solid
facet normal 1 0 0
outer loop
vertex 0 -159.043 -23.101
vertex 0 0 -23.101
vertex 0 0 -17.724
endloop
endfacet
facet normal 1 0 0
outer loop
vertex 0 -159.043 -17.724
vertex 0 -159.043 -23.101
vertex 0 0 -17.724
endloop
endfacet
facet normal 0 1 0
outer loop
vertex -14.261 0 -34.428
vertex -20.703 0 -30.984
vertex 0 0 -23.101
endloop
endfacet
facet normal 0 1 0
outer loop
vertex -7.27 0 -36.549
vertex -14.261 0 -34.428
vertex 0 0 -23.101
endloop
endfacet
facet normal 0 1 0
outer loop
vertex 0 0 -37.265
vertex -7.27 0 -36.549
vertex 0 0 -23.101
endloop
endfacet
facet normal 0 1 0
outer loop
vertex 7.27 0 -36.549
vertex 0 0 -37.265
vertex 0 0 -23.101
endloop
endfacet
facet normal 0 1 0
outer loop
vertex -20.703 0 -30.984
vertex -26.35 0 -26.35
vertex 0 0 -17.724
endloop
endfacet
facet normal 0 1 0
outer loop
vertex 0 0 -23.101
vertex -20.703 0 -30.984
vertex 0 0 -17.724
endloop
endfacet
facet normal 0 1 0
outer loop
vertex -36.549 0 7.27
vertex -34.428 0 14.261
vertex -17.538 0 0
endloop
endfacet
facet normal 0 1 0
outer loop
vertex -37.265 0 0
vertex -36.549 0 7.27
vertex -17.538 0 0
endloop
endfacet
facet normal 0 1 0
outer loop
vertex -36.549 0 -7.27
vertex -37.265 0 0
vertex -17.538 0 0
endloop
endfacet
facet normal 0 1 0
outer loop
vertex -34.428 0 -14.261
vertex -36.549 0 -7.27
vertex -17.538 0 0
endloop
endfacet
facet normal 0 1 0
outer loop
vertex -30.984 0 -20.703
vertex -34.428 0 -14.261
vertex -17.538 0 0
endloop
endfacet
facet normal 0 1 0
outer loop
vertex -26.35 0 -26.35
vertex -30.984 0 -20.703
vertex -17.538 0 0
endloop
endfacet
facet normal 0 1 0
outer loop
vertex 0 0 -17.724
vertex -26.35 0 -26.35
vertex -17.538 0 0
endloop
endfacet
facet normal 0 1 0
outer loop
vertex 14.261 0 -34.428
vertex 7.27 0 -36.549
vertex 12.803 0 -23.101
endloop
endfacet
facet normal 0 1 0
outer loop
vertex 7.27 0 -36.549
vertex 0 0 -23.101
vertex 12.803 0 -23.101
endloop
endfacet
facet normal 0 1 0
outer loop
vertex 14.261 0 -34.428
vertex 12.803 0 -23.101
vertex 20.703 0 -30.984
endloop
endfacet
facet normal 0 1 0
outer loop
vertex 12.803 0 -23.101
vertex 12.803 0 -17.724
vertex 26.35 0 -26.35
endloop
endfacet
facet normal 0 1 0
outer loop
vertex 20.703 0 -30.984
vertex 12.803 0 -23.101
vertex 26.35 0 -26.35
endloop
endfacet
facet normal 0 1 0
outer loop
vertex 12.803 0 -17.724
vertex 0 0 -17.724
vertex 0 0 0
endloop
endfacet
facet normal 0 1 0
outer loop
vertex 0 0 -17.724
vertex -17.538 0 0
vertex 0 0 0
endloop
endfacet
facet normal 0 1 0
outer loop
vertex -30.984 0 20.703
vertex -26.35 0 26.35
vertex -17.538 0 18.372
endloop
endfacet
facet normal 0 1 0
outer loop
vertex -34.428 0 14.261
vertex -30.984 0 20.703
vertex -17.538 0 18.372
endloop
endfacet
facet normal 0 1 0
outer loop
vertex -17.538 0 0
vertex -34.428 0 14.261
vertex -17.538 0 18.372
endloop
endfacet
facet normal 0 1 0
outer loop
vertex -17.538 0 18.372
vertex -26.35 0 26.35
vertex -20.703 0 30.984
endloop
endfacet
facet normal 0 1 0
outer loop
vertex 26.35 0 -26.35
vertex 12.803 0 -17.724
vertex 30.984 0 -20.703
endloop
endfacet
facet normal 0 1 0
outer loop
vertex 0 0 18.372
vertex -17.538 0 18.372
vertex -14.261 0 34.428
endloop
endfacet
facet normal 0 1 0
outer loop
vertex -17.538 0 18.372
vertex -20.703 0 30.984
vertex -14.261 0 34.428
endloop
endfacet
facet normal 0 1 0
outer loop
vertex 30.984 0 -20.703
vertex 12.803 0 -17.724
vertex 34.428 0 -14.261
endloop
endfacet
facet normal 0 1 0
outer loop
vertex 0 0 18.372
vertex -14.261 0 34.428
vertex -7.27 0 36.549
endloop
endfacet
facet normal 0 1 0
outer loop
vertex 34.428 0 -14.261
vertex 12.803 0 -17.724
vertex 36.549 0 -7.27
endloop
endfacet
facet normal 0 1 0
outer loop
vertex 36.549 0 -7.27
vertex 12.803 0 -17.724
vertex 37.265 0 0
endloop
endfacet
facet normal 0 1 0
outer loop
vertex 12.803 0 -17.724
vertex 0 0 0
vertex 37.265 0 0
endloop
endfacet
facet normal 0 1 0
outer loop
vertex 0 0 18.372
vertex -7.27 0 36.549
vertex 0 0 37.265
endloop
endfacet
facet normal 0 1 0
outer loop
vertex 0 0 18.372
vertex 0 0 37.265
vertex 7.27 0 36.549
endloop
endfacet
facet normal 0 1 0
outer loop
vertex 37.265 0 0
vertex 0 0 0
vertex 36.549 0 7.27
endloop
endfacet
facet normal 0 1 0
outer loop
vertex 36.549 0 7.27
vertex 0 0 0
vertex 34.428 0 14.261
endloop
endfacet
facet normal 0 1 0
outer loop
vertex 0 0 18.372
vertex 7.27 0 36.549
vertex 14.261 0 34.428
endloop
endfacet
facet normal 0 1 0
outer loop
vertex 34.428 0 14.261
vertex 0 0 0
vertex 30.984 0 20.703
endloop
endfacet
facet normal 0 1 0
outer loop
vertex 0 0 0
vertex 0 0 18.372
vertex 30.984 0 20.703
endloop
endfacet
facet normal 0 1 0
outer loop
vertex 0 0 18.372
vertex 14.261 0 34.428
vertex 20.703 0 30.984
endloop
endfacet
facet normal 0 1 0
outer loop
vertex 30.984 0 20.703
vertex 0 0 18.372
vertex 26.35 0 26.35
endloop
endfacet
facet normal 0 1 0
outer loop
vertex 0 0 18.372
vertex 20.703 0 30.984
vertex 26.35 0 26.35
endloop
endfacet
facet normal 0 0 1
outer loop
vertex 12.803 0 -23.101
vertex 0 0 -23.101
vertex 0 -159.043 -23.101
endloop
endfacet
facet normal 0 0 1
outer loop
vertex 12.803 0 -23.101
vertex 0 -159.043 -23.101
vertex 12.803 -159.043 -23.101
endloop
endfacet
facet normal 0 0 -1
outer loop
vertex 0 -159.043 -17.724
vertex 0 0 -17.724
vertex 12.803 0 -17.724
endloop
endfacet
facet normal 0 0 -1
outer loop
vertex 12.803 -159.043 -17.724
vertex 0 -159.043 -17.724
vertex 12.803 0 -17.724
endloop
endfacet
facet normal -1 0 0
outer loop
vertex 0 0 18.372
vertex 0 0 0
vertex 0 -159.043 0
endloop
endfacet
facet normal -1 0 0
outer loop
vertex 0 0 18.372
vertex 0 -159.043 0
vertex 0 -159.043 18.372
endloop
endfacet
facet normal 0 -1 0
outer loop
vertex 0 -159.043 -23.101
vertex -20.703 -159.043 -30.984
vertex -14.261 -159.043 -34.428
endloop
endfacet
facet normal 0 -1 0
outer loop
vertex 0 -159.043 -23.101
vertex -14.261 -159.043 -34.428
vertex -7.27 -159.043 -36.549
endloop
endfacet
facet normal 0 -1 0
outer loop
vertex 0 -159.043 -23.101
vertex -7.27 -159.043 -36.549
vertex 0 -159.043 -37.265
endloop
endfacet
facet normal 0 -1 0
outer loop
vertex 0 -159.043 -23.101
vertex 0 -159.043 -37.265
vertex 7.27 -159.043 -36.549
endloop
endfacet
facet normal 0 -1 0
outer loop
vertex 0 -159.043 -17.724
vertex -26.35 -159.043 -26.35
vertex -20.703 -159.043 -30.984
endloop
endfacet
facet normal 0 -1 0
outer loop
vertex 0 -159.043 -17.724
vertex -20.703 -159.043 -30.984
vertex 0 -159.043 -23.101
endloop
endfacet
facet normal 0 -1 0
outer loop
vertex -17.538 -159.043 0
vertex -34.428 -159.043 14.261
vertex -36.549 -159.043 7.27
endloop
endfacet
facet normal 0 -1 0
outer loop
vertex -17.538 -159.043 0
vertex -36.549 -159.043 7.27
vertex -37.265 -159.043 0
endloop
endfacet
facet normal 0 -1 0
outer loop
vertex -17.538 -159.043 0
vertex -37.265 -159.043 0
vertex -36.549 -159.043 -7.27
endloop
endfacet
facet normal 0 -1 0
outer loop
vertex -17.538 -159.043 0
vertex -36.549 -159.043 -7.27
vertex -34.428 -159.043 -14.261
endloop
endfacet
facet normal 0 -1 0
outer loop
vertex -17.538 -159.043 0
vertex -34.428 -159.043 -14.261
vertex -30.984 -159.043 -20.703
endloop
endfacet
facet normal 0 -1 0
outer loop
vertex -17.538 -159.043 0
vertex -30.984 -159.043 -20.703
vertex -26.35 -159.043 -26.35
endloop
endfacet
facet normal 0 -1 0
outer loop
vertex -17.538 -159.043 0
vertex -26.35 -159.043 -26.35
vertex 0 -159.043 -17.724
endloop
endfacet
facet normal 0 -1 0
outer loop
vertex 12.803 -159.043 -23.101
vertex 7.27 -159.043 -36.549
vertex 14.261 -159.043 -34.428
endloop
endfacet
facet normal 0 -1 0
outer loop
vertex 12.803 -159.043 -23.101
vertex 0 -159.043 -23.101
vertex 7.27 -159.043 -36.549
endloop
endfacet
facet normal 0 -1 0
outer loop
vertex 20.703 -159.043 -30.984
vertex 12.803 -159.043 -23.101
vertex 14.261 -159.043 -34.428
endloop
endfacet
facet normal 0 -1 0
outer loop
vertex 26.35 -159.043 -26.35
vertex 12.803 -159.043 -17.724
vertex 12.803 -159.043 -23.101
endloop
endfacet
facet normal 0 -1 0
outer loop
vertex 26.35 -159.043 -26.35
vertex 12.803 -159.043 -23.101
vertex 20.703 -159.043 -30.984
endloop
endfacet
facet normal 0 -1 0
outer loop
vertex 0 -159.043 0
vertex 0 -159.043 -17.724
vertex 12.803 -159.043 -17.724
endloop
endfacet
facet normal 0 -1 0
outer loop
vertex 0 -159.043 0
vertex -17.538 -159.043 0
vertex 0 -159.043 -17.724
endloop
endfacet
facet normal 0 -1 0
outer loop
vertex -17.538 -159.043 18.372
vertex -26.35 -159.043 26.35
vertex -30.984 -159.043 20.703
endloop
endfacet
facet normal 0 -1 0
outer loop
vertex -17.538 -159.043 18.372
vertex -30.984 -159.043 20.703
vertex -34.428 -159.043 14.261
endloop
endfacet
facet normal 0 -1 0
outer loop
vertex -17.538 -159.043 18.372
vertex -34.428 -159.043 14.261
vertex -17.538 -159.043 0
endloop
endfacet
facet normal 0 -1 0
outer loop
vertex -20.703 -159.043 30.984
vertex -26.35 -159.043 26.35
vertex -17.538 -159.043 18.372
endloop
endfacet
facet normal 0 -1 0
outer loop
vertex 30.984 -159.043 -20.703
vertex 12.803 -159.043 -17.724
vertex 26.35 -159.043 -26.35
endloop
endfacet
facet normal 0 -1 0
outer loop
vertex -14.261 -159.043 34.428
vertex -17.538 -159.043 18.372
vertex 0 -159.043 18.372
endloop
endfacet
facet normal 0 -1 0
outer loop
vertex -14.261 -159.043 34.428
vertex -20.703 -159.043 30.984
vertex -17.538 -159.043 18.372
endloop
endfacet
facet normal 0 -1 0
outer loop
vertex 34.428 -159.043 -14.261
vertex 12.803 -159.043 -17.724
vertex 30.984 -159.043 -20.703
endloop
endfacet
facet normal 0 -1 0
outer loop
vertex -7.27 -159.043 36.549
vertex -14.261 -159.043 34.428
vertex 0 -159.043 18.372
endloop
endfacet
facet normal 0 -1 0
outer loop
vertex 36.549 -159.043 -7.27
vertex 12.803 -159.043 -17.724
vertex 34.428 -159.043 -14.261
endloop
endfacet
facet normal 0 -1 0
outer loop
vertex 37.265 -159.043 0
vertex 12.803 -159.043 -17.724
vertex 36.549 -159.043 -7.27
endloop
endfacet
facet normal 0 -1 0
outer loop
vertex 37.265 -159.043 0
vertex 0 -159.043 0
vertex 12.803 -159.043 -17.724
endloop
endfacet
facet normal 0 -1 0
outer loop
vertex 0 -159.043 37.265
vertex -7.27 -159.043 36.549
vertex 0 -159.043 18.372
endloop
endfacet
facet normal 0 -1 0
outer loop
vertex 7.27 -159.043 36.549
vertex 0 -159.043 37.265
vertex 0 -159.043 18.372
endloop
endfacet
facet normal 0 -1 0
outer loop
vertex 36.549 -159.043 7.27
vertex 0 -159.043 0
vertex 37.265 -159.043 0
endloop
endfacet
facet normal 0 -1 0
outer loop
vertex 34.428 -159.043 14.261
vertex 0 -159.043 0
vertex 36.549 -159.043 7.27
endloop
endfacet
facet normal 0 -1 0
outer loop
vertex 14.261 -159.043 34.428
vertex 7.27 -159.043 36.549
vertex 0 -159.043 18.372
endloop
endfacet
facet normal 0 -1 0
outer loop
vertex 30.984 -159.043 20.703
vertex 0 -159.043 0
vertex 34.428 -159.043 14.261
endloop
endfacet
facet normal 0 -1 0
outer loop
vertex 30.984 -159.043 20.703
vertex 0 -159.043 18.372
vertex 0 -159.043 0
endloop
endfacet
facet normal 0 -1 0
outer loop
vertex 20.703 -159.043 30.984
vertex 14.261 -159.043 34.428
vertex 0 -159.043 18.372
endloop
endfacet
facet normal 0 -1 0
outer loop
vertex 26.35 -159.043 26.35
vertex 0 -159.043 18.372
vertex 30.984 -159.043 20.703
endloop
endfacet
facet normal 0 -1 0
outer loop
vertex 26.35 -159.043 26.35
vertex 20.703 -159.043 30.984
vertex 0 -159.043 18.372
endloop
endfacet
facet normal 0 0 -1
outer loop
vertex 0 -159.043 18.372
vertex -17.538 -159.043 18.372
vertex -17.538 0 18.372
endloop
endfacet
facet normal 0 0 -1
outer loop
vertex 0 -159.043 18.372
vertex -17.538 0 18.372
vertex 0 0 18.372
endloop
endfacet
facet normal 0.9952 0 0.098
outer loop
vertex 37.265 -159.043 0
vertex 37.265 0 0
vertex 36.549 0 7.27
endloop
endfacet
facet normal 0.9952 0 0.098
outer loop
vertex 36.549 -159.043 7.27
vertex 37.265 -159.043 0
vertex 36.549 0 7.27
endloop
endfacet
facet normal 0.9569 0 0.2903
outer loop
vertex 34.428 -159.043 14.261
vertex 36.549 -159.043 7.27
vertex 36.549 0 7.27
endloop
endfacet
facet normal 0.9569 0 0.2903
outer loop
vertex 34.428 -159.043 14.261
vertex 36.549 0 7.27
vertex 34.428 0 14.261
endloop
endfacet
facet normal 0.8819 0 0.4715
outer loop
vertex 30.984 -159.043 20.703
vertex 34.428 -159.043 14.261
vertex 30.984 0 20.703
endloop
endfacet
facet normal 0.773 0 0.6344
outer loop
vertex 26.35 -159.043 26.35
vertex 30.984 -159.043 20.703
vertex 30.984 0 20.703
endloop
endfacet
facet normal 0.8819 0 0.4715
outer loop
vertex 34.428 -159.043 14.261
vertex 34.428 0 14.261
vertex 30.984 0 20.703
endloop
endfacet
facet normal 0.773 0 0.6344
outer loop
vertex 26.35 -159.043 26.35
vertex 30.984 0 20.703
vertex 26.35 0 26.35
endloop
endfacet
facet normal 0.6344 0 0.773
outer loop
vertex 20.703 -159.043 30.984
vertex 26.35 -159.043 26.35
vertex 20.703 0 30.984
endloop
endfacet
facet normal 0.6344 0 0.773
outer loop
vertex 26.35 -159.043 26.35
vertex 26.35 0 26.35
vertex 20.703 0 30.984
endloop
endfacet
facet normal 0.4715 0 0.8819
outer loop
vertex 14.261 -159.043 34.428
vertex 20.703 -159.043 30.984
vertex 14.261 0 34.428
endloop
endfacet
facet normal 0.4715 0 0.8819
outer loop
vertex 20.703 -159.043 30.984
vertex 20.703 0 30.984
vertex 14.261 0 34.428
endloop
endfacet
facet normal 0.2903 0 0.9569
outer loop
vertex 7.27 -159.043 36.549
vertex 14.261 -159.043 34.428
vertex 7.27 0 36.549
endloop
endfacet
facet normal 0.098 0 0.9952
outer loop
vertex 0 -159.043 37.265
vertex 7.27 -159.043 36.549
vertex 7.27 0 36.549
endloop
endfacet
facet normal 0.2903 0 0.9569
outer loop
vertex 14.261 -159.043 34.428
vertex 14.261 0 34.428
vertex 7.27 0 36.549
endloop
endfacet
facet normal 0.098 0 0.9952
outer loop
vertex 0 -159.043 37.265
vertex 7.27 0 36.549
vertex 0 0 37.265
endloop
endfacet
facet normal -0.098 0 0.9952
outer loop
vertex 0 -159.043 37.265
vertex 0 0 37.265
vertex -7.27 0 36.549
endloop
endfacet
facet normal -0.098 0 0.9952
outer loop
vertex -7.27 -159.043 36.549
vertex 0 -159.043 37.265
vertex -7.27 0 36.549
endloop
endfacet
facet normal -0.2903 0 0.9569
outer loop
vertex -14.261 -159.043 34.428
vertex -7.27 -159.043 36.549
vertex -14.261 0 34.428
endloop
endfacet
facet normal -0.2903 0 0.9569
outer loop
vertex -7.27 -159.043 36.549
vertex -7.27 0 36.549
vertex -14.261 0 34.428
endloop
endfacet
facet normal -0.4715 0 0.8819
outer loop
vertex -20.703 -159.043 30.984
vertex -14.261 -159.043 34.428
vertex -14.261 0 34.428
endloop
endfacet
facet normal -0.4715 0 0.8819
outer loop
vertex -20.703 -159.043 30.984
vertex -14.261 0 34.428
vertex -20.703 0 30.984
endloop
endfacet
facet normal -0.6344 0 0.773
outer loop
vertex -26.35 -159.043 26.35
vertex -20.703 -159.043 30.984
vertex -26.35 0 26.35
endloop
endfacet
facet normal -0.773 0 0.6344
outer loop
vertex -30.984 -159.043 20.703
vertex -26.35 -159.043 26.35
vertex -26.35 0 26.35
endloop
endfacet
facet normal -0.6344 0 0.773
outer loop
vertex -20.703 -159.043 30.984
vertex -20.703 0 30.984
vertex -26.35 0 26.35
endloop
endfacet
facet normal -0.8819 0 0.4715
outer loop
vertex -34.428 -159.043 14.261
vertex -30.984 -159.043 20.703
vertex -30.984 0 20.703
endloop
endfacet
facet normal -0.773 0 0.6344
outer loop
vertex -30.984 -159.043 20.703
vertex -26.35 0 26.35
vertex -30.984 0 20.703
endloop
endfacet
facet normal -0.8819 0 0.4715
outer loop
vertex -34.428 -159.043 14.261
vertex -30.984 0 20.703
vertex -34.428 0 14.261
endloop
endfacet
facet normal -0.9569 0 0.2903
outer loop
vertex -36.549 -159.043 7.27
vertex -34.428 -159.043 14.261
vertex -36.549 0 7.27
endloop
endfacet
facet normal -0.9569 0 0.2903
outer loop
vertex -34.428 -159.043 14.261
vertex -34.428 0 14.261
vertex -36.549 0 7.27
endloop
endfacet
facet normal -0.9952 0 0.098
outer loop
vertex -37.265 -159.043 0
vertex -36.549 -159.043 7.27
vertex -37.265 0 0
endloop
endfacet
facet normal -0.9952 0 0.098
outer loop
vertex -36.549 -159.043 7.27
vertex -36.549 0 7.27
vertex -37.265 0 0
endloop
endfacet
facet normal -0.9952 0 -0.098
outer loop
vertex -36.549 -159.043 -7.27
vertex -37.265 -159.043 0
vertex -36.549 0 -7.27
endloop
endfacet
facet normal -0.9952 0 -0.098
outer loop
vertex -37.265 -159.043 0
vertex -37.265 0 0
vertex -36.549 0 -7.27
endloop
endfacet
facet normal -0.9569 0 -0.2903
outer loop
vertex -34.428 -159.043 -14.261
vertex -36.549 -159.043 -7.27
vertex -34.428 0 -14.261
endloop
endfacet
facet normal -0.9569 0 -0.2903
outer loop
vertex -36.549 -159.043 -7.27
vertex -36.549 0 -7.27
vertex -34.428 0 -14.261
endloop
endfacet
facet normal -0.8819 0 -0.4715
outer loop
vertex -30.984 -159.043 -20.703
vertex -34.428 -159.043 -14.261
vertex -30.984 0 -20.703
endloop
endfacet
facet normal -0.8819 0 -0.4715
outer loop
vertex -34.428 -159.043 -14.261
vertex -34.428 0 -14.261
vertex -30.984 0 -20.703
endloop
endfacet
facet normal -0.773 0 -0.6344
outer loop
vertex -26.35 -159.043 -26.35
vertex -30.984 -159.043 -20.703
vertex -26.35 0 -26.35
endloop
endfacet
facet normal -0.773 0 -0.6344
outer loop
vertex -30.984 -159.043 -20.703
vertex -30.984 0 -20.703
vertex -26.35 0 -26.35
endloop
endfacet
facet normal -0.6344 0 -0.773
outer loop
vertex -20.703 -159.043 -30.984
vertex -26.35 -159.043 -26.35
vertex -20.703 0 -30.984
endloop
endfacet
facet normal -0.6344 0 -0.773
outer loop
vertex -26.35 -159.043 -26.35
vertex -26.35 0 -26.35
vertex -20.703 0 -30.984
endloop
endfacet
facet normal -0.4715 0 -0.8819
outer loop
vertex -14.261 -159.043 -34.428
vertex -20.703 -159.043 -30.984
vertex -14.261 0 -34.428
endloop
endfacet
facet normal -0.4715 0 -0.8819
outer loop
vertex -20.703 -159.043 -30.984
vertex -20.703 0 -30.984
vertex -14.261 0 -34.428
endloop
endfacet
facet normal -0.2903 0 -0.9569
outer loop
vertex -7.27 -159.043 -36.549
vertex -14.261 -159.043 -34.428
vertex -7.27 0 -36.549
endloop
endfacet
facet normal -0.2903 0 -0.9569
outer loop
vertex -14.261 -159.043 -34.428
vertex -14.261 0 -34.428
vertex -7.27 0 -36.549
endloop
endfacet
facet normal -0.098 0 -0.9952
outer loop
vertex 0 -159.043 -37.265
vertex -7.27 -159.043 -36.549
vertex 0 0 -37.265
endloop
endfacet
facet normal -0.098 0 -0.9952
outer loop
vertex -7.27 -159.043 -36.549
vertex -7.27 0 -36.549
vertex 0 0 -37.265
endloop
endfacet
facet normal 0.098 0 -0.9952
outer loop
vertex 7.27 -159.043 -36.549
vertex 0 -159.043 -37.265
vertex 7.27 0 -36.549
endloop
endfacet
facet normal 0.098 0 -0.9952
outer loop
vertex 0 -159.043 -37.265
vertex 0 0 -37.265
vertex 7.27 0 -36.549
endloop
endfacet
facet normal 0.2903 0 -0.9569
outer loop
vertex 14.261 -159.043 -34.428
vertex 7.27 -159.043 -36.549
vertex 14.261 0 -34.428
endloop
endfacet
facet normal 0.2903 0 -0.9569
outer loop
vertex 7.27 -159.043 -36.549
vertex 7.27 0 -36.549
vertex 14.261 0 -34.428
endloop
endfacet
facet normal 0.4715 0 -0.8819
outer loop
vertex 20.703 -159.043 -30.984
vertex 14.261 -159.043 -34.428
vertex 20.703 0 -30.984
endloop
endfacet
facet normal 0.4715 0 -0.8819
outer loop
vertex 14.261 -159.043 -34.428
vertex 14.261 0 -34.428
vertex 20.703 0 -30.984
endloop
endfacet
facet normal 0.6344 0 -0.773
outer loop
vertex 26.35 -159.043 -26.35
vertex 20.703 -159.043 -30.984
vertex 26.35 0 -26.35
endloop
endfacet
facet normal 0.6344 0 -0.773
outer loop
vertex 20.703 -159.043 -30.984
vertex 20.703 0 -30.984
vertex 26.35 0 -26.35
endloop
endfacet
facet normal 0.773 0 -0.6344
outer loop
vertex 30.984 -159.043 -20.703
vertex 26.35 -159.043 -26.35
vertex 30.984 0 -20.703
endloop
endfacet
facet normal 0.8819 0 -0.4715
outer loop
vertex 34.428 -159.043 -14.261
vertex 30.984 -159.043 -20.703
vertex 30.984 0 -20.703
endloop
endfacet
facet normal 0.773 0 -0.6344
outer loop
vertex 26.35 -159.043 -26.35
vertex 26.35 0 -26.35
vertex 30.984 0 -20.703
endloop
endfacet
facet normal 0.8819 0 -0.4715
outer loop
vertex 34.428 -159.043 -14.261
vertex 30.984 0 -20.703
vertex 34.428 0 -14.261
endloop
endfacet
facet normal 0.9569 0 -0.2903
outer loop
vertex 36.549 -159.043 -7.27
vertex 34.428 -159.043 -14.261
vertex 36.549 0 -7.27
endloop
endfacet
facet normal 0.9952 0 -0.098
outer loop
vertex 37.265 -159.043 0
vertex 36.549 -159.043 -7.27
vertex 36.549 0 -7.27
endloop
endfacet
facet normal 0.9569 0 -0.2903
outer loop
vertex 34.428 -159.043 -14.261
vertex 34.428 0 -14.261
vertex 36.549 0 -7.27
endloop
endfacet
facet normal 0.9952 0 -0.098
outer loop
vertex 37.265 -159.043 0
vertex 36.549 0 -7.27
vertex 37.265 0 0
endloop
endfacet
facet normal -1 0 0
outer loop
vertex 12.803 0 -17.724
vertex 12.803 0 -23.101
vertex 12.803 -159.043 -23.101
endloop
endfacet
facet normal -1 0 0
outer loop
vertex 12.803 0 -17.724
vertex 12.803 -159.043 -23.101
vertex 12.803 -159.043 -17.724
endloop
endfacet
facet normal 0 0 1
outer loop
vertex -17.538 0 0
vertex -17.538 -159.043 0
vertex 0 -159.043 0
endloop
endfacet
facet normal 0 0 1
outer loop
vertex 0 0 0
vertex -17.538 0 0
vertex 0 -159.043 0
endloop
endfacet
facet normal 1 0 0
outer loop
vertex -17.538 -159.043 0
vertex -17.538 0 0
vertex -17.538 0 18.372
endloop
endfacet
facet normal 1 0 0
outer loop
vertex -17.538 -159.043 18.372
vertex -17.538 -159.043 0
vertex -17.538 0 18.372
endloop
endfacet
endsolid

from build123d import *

# Parameters (mm, degrees)
F0_R     = 37.264648
F0_W     = 12.802701
F0_H     = 5.376745
F0_W_2   = 17.537981
F0_H_2   = 18.3715
F1_DEPTH = 159.043342


with BuildPart() as f1:
    # F0 (on Front) → F1 (new body)
    with BuildSketch(Plane.XZ):
        Circle(F0_R)
        with Locations((6.40135, -20.412508)):
            Rectangle(F0_W, F0_H, mode=Mode.SUBTRACT)
        with Locations((-8.76899, 9.18575)):
            Rectangle(F0_W_2, F0_H_2, mode=Mode.SUBTRACT)
    extrude(amount=F1_DEPTH)


solid = f1.part
